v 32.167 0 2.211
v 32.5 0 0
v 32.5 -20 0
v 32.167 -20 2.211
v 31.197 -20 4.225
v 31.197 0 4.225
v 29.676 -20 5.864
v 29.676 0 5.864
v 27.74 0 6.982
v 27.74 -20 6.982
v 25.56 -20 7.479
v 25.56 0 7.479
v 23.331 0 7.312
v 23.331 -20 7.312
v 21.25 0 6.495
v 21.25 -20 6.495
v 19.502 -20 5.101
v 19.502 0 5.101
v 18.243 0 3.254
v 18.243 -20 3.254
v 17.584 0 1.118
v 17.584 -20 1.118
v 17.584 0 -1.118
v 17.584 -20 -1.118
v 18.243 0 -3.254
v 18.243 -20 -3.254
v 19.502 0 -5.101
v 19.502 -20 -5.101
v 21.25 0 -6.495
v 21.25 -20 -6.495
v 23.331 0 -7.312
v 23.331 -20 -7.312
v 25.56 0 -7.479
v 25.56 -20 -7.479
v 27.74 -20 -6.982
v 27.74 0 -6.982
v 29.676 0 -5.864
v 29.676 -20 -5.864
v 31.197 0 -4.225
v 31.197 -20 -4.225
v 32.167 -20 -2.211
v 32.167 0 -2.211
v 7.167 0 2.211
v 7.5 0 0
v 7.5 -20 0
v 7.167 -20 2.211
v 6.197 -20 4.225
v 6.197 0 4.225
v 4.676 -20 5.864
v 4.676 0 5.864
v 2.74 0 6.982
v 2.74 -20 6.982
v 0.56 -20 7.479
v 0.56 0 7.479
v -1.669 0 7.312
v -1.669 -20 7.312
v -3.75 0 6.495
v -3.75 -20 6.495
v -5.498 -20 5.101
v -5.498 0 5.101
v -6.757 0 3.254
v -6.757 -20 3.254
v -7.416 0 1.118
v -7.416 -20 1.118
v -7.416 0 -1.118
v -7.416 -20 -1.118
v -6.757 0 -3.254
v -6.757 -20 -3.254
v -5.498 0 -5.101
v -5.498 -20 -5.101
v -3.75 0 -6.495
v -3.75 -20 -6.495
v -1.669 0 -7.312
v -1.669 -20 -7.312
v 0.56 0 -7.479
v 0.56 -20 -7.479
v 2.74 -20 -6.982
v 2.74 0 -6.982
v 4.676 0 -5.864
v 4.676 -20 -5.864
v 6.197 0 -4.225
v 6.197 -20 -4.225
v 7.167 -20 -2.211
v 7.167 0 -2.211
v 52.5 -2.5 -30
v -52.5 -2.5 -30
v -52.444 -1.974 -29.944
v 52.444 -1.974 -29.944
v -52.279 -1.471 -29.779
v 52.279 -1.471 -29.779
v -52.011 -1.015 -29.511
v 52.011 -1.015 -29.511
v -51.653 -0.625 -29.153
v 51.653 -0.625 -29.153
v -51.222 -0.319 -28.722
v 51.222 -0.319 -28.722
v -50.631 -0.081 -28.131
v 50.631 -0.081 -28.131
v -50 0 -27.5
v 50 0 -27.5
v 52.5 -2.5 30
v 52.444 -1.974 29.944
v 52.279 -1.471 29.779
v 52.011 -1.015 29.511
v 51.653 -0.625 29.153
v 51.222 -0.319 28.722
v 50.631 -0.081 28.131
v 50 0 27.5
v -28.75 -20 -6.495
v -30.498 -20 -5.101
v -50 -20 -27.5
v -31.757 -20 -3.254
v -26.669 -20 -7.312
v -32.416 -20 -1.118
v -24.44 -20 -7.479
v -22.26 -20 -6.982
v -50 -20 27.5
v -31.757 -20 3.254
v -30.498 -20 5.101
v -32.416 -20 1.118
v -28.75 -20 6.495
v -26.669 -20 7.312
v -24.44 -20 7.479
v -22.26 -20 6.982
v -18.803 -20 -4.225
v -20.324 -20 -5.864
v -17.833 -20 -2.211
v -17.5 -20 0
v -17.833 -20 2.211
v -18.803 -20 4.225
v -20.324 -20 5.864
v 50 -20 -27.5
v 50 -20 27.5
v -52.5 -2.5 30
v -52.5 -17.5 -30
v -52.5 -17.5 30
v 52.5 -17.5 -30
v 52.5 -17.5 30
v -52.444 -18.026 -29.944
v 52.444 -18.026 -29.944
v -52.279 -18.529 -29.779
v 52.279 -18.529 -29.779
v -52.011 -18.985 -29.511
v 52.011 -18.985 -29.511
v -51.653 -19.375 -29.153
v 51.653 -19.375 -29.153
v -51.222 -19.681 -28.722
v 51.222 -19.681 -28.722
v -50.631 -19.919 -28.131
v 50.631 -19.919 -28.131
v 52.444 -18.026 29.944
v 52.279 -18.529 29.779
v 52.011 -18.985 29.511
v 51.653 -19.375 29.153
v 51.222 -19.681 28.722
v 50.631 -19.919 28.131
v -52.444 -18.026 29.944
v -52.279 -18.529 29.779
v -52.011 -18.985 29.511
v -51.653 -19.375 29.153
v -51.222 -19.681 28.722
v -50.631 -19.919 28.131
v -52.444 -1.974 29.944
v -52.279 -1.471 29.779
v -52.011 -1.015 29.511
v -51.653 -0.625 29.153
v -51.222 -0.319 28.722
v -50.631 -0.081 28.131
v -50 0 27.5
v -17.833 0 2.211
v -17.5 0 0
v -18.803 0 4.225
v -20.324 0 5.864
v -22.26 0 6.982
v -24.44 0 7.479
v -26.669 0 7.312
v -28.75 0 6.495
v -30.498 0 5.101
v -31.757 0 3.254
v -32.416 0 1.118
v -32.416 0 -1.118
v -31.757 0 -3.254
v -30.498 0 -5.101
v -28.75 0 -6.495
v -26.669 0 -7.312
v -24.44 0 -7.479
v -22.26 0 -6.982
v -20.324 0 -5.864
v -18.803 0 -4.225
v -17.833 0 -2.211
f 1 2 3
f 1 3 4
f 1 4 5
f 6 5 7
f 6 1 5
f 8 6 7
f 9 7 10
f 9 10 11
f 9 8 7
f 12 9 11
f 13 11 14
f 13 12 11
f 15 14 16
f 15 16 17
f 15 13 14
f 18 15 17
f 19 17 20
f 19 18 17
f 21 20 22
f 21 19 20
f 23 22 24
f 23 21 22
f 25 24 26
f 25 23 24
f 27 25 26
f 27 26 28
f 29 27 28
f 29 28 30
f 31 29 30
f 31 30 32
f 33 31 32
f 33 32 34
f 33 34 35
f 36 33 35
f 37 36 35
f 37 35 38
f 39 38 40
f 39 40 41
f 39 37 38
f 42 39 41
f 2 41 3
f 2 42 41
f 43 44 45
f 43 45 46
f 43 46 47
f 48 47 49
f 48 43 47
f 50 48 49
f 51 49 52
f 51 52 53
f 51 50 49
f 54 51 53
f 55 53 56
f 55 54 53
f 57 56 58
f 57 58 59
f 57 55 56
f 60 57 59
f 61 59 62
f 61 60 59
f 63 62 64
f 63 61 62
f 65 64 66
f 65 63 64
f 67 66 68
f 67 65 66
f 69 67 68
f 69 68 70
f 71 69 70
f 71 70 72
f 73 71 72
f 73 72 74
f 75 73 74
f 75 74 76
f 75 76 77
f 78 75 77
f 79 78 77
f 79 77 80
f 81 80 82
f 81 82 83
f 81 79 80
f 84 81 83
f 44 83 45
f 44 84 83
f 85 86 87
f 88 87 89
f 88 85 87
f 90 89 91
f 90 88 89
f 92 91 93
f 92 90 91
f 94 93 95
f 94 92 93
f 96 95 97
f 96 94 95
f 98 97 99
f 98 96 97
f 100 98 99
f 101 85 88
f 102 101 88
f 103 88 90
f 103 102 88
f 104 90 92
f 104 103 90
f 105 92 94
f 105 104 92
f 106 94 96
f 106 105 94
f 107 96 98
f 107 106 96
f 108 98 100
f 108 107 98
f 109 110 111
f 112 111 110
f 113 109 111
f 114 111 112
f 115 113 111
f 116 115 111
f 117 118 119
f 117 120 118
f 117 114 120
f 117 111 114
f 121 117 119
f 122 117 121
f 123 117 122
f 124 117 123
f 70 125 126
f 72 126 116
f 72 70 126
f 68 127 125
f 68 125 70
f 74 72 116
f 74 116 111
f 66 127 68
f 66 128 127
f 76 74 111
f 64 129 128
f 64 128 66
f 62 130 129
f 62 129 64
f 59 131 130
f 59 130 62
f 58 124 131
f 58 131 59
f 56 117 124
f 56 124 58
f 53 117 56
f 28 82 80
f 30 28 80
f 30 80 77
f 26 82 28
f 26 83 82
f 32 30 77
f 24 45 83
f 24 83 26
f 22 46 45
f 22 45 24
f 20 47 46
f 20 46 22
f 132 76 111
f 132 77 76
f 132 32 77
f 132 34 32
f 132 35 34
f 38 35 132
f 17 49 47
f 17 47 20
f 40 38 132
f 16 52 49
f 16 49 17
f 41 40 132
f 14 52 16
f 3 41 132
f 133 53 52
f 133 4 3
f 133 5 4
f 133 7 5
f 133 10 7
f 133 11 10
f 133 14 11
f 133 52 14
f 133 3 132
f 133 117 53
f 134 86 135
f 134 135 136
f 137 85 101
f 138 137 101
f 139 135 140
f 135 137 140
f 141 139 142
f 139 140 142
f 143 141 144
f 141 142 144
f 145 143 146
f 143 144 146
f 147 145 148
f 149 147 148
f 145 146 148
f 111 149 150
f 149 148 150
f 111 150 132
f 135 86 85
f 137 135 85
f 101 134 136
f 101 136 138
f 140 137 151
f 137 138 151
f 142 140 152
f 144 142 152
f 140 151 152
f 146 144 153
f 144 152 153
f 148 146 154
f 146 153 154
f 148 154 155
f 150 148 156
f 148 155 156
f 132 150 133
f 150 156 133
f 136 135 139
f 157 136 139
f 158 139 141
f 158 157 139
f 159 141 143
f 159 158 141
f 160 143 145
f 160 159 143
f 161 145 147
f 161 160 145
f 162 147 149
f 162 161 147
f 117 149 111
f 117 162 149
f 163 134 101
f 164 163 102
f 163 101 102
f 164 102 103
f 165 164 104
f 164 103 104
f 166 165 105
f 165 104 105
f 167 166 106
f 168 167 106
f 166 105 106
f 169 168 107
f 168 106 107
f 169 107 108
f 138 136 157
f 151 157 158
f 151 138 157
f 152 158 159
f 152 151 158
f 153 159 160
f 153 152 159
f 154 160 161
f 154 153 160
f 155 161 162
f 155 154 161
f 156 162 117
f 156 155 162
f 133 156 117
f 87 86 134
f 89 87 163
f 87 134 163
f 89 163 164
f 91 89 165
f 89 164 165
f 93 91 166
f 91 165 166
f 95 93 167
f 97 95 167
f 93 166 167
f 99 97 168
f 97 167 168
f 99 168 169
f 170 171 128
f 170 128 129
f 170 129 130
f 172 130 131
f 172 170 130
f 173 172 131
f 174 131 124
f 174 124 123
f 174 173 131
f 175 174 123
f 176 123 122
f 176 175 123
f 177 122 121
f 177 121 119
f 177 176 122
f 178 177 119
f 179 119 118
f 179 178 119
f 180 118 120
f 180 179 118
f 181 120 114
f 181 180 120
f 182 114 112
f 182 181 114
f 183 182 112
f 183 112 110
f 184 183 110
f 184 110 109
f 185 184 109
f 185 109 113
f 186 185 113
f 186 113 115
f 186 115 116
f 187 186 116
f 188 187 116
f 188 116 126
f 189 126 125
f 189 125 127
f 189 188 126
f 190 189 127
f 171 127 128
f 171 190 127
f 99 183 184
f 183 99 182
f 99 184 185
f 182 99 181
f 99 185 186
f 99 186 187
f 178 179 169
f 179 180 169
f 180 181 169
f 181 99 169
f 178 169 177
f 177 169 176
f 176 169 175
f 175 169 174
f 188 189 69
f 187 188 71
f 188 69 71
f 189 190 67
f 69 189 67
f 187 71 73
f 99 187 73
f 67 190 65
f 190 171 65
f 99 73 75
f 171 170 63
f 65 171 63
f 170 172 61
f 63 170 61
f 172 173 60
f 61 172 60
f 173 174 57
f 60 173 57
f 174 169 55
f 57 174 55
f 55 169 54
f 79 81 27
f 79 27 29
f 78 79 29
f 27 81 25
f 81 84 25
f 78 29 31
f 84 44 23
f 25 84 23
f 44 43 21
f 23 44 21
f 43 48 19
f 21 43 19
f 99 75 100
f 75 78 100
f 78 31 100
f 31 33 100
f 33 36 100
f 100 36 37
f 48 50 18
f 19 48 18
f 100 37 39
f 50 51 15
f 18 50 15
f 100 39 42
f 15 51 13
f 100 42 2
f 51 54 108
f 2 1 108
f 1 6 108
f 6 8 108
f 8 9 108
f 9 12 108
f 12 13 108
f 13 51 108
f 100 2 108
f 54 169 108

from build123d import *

# Parameters (mm, degrees)
F0_W     = 105
F0_H     = 60
F0_R     = 7.5
F1_DEPTH = 20
F2_R     = 2.5


with BuildPart() as f1:
    # F0 (on Front) → F1 (new body)
    with BuildSketch(Plane.XZ):
        Rectangle(F0_W, F0_H)
        with Locations((-25, 0)):
            Circle(F0_R, mode=Mode.SUBTRACT)
        Circle(F0_R, mode=Mode.SUBTRACT)
        with Locations((25, 0)):
            Circle(F0_R, mode=Mode.SUBTRACT)
    extrude(amount=F1_DEPTH)

    # F2
    f2_edges = [f1.edges().sort_by_distance(p)[0] for p in [
        (0, -20, -30),
        (-52.5, -20, 0),
        (0, -20, 30),
        (52.5, 0, 0),
        (0, 0, -30),
        (-52.5, 0, 0),
        (0, 0, 30),
        (52.5, -20, 0),
    ]]
    fillet(f2_edges, radius=F2_R)


solid = f1.part
